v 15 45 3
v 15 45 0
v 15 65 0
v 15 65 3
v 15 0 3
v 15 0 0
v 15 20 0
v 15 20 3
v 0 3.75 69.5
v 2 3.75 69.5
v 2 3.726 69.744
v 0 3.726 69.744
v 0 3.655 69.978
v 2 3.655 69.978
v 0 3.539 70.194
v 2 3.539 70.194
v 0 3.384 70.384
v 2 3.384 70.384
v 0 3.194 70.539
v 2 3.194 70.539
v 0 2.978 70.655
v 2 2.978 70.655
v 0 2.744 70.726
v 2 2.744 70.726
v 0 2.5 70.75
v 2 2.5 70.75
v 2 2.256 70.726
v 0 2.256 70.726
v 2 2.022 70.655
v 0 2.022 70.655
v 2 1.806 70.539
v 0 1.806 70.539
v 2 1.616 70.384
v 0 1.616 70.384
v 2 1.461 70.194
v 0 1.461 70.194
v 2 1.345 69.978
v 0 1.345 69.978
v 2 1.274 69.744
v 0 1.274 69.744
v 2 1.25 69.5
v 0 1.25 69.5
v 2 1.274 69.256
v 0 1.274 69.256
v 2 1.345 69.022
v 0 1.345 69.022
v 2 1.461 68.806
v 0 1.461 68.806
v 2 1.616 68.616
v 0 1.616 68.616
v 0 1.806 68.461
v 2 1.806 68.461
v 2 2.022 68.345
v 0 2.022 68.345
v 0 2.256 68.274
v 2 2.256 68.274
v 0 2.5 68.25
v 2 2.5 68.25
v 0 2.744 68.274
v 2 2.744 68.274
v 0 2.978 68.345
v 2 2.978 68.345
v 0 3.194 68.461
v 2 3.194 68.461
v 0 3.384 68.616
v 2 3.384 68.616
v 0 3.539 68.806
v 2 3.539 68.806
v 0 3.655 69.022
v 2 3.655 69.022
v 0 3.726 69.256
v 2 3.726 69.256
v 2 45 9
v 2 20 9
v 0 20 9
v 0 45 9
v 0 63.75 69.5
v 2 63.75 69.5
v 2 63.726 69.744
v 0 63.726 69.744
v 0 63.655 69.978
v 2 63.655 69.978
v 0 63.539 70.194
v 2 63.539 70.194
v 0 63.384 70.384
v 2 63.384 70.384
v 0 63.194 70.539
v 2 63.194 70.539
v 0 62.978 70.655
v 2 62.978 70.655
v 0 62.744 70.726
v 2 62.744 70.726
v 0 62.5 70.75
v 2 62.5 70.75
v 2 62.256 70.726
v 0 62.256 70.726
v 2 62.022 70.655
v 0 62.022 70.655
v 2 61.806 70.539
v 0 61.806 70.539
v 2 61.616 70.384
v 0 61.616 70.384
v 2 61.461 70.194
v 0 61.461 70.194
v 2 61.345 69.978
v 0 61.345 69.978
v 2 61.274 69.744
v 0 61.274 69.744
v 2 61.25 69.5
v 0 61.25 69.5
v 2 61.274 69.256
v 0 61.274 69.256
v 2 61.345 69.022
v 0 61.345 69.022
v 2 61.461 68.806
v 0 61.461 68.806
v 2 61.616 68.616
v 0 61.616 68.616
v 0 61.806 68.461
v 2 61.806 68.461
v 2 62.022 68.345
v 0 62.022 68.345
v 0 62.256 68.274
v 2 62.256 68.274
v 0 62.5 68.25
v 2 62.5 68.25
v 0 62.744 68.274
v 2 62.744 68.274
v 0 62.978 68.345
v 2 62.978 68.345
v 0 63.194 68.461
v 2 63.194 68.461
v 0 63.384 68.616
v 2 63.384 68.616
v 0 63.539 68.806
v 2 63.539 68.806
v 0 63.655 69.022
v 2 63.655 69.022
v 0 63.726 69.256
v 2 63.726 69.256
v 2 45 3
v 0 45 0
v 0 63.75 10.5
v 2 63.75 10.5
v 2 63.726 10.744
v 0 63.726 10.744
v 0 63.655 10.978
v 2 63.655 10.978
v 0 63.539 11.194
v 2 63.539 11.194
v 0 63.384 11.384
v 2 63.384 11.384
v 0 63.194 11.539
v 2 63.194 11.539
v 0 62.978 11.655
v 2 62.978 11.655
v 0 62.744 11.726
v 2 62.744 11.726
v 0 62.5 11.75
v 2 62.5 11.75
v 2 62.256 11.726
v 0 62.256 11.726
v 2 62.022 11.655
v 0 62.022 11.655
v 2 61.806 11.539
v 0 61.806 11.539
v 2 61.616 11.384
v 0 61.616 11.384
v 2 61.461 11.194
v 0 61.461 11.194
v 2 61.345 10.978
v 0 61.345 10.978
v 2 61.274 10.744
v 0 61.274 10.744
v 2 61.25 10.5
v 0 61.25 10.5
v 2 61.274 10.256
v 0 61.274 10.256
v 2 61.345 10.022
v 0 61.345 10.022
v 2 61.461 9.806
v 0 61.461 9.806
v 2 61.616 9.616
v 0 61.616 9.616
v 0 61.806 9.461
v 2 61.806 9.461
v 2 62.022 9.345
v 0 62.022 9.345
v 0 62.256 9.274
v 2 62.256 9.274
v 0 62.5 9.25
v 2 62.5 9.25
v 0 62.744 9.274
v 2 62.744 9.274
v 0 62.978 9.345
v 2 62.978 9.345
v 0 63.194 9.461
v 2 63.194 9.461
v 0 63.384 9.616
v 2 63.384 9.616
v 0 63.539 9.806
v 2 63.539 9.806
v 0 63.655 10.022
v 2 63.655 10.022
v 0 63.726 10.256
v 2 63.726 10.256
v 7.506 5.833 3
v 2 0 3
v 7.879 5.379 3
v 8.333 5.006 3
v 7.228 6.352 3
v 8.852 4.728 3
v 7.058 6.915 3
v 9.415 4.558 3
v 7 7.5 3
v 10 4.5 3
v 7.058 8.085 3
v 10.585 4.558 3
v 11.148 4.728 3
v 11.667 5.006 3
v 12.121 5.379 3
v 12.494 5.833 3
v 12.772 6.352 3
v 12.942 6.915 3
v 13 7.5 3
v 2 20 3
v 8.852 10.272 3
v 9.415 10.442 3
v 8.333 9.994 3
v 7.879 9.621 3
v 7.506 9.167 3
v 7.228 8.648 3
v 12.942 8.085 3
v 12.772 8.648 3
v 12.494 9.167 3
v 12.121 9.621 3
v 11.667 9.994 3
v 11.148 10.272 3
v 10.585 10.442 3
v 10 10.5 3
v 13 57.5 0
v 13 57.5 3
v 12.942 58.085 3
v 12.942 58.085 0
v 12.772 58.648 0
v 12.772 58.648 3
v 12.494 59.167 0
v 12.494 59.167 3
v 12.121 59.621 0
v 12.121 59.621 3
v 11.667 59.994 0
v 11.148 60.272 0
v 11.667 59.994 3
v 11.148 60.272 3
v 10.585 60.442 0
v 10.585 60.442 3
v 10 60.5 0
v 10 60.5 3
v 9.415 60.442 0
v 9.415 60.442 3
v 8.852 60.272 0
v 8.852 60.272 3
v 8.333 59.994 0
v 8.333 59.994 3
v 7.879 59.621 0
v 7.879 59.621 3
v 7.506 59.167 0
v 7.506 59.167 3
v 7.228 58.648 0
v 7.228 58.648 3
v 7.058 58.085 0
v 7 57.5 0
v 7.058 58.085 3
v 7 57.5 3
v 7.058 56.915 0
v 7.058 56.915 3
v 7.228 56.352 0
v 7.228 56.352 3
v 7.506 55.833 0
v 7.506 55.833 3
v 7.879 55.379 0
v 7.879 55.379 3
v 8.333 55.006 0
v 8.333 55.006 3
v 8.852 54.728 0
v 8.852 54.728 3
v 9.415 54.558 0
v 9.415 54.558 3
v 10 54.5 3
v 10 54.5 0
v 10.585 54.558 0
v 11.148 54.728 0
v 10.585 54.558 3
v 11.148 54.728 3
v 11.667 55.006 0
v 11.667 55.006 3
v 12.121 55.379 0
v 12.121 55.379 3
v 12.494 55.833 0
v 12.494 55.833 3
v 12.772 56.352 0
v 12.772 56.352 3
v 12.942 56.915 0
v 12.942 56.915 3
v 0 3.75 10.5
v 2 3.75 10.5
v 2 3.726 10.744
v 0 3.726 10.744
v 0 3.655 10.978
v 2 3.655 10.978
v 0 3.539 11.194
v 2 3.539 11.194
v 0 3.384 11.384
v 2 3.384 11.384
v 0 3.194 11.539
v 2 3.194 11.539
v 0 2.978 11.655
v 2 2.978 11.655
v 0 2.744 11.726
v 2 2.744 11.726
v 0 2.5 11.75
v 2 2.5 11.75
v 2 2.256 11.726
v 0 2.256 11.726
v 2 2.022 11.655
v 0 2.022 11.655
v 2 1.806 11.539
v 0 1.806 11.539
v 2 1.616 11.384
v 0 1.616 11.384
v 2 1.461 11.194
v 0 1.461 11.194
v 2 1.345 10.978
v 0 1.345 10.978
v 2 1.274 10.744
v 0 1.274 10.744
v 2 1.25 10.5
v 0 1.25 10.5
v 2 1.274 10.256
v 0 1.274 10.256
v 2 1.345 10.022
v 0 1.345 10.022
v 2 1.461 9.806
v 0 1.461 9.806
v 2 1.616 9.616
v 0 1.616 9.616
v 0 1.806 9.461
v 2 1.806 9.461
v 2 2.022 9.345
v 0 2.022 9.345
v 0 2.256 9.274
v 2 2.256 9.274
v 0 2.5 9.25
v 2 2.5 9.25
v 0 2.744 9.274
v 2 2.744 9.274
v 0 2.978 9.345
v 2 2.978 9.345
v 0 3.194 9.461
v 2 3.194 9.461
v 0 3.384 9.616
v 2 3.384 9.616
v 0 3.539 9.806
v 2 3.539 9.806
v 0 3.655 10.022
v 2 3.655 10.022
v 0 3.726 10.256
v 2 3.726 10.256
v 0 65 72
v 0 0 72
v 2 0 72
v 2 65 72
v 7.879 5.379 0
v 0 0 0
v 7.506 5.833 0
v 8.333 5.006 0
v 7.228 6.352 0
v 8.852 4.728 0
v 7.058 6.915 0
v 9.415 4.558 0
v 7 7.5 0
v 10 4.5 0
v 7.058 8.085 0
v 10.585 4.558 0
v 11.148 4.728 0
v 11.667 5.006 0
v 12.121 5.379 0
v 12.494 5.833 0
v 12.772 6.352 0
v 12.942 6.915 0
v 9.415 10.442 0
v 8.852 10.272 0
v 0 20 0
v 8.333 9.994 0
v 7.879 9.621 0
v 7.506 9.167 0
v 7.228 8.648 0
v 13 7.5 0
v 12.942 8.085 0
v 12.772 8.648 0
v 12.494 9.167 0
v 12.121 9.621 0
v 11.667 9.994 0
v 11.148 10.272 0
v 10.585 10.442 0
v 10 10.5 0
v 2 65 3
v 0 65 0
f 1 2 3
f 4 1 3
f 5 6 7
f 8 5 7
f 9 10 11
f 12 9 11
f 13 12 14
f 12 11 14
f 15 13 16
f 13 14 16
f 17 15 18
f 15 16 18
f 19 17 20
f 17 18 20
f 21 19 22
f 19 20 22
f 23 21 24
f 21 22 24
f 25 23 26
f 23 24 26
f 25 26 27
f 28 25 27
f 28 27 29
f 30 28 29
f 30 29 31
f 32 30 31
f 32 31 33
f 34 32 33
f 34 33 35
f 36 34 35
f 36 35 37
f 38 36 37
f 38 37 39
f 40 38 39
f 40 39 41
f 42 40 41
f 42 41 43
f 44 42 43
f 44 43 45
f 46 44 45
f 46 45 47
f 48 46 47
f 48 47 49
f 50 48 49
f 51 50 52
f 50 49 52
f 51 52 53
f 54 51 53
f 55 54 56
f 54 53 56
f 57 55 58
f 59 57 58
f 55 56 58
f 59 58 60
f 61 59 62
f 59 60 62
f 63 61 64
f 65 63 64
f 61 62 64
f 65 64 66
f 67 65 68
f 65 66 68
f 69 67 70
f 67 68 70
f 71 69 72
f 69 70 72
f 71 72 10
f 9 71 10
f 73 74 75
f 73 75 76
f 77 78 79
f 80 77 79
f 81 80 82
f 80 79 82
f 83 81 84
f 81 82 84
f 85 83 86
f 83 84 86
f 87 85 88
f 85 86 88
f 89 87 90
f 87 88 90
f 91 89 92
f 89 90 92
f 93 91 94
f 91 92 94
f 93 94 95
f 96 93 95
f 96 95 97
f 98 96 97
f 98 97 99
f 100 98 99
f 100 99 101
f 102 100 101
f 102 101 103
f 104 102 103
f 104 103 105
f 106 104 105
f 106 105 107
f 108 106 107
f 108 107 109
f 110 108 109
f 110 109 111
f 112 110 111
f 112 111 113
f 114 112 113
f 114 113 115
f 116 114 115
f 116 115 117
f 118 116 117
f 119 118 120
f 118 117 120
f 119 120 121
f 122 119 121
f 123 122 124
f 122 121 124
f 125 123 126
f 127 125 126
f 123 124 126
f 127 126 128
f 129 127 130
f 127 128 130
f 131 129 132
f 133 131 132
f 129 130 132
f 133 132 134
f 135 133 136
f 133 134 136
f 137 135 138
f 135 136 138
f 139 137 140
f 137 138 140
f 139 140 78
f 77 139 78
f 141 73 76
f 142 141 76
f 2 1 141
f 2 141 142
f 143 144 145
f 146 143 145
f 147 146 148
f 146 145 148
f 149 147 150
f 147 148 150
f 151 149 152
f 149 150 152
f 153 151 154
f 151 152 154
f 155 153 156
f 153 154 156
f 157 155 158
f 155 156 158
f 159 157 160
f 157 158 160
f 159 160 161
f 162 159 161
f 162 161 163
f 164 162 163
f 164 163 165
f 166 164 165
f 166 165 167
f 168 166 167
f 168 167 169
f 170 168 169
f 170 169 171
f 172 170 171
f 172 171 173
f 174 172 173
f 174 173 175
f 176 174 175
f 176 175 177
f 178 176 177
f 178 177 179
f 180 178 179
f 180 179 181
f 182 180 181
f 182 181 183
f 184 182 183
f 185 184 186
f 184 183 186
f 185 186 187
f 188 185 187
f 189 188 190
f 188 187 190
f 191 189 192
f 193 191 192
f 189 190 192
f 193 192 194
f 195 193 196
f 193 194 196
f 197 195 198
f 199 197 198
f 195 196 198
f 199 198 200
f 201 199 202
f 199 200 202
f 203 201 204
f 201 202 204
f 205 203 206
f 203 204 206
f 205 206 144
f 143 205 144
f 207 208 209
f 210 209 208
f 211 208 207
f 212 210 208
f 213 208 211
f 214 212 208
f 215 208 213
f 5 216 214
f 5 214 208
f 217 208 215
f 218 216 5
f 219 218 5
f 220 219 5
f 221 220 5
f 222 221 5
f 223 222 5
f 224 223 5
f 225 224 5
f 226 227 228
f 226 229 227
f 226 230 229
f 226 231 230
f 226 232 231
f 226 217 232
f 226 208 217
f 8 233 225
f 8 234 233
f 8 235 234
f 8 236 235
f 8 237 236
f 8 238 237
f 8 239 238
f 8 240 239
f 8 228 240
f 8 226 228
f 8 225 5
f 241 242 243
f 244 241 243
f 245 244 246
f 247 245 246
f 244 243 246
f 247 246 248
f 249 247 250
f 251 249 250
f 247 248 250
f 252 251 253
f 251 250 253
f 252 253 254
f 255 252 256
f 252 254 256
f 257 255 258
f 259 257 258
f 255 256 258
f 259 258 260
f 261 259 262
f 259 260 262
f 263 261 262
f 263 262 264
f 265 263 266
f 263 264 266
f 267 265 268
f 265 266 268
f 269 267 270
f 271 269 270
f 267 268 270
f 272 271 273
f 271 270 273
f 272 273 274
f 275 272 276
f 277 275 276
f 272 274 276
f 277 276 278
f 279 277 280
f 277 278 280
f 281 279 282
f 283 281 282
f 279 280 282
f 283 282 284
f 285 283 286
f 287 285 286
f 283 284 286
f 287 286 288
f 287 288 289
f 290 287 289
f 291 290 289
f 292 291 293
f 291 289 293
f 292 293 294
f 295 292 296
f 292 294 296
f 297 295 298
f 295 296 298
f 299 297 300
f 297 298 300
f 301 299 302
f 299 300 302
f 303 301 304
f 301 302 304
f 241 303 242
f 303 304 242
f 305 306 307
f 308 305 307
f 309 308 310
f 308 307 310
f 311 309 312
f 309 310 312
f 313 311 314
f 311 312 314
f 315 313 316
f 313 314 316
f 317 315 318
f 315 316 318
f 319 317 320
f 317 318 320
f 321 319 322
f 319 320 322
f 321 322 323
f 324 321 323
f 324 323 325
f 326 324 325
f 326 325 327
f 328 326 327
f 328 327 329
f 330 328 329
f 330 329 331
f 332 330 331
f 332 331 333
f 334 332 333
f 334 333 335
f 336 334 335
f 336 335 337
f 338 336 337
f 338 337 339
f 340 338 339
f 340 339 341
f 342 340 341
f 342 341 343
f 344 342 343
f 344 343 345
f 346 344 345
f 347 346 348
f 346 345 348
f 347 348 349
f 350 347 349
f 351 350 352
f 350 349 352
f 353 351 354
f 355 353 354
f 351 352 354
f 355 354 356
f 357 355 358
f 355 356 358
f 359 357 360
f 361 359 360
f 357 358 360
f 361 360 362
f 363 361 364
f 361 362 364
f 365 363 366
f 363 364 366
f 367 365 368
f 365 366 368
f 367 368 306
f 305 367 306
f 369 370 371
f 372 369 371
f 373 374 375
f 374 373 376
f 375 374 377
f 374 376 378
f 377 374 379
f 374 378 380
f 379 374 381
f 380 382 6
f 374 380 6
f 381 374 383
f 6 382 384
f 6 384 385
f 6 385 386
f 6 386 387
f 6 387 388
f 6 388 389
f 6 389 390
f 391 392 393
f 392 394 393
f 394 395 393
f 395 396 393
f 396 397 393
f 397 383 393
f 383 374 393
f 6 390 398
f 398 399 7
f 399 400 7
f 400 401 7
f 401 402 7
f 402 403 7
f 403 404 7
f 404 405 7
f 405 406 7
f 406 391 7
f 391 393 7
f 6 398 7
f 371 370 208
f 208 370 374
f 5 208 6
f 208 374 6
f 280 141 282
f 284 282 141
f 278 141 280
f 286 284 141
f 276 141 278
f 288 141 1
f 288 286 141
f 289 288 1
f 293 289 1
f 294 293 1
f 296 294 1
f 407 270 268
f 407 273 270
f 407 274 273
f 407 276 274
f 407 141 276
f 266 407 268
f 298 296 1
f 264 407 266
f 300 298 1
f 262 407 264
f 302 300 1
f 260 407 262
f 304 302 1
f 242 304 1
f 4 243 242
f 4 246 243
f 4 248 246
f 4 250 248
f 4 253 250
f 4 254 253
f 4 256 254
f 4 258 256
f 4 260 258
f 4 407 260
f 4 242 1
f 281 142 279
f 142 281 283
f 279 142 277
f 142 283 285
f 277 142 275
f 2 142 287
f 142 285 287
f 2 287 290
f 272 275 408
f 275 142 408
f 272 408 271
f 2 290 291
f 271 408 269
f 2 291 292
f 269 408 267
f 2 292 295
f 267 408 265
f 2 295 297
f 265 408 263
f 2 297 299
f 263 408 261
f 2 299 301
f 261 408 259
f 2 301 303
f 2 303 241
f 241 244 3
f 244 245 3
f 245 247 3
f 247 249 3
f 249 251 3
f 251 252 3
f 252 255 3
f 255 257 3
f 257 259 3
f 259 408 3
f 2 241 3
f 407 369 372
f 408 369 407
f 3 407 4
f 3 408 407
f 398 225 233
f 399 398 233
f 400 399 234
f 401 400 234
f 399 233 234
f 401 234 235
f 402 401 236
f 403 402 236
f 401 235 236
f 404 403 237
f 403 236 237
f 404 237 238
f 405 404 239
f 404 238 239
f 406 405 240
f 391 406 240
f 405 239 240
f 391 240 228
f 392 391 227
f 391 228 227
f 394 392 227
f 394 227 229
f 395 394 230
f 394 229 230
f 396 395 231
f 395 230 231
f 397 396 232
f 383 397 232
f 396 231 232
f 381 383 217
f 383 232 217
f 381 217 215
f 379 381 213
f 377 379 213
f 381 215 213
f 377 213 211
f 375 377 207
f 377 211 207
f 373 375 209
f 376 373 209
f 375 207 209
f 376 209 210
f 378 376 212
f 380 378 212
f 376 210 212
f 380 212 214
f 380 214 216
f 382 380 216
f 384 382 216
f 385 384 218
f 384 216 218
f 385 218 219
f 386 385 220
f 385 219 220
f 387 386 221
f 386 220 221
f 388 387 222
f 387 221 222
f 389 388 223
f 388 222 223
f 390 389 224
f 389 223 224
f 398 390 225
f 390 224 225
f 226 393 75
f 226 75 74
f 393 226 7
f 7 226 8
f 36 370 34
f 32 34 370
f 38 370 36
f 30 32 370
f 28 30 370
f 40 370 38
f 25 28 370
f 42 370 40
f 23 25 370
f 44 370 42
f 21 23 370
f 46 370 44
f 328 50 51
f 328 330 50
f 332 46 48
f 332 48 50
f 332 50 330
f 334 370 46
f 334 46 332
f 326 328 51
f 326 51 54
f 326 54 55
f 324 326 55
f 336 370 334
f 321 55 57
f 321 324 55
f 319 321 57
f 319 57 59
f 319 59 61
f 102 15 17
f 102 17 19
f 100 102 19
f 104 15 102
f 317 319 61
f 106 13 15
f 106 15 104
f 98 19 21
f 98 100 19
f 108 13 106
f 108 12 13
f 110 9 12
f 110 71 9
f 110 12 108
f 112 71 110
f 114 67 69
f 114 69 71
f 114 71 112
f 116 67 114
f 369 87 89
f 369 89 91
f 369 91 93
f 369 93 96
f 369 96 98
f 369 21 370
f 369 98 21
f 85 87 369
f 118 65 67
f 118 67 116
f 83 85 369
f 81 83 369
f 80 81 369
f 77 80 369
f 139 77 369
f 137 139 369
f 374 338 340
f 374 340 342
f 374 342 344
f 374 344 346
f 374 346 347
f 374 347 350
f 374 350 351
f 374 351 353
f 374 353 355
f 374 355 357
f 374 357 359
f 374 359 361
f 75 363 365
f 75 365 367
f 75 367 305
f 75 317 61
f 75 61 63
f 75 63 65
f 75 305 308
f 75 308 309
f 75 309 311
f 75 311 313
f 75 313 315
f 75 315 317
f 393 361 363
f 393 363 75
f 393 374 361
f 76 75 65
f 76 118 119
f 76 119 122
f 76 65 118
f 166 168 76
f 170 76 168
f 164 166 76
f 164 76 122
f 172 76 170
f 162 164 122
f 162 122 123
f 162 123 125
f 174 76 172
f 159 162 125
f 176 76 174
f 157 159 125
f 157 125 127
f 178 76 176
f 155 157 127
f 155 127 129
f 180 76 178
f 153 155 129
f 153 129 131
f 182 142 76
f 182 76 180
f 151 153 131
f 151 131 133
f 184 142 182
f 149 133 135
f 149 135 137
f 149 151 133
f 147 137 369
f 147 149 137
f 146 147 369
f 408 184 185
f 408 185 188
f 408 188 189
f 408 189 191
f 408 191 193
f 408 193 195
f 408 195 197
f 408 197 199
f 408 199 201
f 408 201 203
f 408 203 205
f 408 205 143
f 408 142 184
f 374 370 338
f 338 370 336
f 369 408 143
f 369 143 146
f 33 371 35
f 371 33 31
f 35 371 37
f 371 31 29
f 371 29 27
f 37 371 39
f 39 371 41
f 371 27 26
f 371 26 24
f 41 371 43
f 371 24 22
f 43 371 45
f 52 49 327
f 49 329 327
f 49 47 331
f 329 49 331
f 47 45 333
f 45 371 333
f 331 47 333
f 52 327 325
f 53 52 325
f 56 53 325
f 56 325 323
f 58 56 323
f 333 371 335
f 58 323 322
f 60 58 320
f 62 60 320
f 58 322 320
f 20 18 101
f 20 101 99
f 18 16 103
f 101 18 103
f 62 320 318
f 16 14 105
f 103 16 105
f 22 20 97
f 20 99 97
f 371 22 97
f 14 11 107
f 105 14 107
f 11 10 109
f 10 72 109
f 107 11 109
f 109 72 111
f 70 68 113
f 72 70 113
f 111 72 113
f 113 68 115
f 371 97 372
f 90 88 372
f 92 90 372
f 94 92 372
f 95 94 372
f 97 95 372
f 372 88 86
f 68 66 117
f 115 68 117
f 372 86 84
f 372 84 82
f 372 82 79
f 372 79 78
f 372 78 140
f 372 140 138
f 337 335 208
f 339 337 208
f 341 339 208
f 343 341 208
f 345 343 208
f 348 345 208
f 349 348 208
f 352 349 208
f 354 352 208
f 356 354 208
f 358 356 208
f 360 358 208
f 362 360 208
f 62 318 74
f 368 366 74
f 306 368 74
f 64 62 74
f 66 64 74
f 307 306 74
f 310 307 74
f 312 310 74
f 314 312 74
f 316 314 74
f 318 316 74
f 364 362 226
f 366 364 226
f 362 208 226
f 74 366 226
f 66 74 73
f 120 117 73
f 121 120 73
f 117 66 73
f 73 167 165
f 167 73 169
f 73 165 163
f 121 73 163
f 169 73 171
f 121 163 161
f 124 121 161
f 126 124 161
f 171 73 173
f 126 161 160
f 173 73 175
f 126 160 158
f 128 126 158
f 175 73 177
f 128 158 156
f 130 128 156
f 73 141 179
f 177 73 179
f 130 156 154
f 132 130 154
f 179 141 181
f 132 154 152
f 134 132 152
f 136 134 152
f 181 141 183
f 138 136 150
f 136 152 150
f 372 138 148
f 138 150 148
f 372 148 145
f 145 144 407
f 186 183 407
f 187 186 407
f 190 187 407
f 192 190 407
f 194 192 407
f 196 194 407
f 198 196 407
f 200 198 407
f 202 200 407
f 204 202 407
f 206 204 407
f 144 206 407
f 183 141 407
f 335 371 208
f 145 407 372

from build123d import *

# Parameters (mm, degrees)
SKETCH_1_W          = 15
SKETCH_1_H          = 65
EXTRUDE_1_DEPTH     = 3
SKETCH_2_R          = 3
SKETCH_2_W          = 15
SKETCH_2_H          = 25
CUT_EXTRUDE_1_DEPTH = 3
SKETCH_4_W          = 2
SKETCH_4_H          = 65
EXTRUDE_2_DEPTH     = 69
SKETCH_5_W          = 6
SKETCH_5_H          = 25
CUT_EXTRUDE_2_DEPTH = 69
SKETCH_6_R          = 1.25
CUT_EXTRUDE_3_DEPTH = 69


with BuildPart() as part:
    # 草圖1 → 填料-伸長1 (new body)
    with BuildSketch(Plane.XY):
        with Locations((7.5, 32.5)):
            Rectangle(SKETCH_1_W, SKETCH_1_H)
    extrude(amount=EXTRUDE_1_DEPTH)

    # 草圖2 → 除料-伸長1 (cut)
    with BuildSketch(Plane.XY.offset(3)):
        with Locations((10, 57.5)):
            Circle(SKETCH_2_R)
        with Locations((10, 7.5)):
            Circle(SKETCH_2_R)
        with Locations((7.5, 32.5)):
            Rectangle(SKETCH_2_W, SKETCH_2_H)
    extrude(amount=-CUT_EXTRUDE_1_DEPTH, mode=Mode.SUBTRACT)


with BuildPart() as cut_extrude_1_piece_1:
    # of the separate pieces the step leaves, piece 1, a body of its own (cut_extrude_1_pieces)
    add(part.part.solids().sort_by_distance((0, 0, 0))[0])



with BuildPart() as cut_extrude_1_piece_2:
    # of the separate pieces the step leaves, piece 2, a body of its own (cut_extrude_1_pieces)
    add(part.part.solids().sort_by_distance((0, 65, 0))[0])


with BuildPart() as cut_extrude_1_piece_1_1:
    add(cut_extrude_1_piece_1.part)

    add(cut_extrude_1_piece_2.part)  # 填料-伸長2 merges 除料-伸長1 piece 2
    # 草圖4 → 填料-伸長2 (add)
    with BuildSketch(Plane.XY.offset(3)):
        with Locations((1, 32.5)):
            Rectangle(SKETCH_4_W, SKETCH_4_H)
    extrude(amount=EXTRUDE_2_DEPTH)

    # 草圖5 → 除料-伸長2 (cut)
    with BuildSketch(Plane(origin=(2, 0, 0), x_dir=(0, 0, -1), z_dir=(1, 0, 0))):
        with Locations((-6, 32.5)):
            Rectangle(SKETCH_5_W, SKETCH_5_H)
    extrude(amount=-CUT_EXTRUDE_2_DEPTH, mode=Mode.SUBTRACT)

    # 草圖6 → 除料-伸長3 (cut)
    with BuildSketch(Plane(origin=(2, 0, 0), x_dir=(0, 0, -1), z_dir=(1, 0, 0))):
        with Locations(Location((-69.5, 62.5, 0), (0, 0, 90))):
            Circle(SKETCH_6_R)
        with Locations(Location((-10.5, 62.5, 0), (0, 0, 90))):
            Circle(SKETCH_6_R)
        with Locations(Location((-69.5, 2.5, 0), (0, 0, 90))):
            Circle(SKETCH_6_R)
        with Locations(Location((-10.5, 2.5, 0), (0, 0, 90))):
            Circle(SKETCH_6_R)
    extrude(amount=-CUT_EXTRUDE_3_DEPTH, mode=Mode.SUBTRACT)


solid = cut_extrude_1_piece_1_1.part
